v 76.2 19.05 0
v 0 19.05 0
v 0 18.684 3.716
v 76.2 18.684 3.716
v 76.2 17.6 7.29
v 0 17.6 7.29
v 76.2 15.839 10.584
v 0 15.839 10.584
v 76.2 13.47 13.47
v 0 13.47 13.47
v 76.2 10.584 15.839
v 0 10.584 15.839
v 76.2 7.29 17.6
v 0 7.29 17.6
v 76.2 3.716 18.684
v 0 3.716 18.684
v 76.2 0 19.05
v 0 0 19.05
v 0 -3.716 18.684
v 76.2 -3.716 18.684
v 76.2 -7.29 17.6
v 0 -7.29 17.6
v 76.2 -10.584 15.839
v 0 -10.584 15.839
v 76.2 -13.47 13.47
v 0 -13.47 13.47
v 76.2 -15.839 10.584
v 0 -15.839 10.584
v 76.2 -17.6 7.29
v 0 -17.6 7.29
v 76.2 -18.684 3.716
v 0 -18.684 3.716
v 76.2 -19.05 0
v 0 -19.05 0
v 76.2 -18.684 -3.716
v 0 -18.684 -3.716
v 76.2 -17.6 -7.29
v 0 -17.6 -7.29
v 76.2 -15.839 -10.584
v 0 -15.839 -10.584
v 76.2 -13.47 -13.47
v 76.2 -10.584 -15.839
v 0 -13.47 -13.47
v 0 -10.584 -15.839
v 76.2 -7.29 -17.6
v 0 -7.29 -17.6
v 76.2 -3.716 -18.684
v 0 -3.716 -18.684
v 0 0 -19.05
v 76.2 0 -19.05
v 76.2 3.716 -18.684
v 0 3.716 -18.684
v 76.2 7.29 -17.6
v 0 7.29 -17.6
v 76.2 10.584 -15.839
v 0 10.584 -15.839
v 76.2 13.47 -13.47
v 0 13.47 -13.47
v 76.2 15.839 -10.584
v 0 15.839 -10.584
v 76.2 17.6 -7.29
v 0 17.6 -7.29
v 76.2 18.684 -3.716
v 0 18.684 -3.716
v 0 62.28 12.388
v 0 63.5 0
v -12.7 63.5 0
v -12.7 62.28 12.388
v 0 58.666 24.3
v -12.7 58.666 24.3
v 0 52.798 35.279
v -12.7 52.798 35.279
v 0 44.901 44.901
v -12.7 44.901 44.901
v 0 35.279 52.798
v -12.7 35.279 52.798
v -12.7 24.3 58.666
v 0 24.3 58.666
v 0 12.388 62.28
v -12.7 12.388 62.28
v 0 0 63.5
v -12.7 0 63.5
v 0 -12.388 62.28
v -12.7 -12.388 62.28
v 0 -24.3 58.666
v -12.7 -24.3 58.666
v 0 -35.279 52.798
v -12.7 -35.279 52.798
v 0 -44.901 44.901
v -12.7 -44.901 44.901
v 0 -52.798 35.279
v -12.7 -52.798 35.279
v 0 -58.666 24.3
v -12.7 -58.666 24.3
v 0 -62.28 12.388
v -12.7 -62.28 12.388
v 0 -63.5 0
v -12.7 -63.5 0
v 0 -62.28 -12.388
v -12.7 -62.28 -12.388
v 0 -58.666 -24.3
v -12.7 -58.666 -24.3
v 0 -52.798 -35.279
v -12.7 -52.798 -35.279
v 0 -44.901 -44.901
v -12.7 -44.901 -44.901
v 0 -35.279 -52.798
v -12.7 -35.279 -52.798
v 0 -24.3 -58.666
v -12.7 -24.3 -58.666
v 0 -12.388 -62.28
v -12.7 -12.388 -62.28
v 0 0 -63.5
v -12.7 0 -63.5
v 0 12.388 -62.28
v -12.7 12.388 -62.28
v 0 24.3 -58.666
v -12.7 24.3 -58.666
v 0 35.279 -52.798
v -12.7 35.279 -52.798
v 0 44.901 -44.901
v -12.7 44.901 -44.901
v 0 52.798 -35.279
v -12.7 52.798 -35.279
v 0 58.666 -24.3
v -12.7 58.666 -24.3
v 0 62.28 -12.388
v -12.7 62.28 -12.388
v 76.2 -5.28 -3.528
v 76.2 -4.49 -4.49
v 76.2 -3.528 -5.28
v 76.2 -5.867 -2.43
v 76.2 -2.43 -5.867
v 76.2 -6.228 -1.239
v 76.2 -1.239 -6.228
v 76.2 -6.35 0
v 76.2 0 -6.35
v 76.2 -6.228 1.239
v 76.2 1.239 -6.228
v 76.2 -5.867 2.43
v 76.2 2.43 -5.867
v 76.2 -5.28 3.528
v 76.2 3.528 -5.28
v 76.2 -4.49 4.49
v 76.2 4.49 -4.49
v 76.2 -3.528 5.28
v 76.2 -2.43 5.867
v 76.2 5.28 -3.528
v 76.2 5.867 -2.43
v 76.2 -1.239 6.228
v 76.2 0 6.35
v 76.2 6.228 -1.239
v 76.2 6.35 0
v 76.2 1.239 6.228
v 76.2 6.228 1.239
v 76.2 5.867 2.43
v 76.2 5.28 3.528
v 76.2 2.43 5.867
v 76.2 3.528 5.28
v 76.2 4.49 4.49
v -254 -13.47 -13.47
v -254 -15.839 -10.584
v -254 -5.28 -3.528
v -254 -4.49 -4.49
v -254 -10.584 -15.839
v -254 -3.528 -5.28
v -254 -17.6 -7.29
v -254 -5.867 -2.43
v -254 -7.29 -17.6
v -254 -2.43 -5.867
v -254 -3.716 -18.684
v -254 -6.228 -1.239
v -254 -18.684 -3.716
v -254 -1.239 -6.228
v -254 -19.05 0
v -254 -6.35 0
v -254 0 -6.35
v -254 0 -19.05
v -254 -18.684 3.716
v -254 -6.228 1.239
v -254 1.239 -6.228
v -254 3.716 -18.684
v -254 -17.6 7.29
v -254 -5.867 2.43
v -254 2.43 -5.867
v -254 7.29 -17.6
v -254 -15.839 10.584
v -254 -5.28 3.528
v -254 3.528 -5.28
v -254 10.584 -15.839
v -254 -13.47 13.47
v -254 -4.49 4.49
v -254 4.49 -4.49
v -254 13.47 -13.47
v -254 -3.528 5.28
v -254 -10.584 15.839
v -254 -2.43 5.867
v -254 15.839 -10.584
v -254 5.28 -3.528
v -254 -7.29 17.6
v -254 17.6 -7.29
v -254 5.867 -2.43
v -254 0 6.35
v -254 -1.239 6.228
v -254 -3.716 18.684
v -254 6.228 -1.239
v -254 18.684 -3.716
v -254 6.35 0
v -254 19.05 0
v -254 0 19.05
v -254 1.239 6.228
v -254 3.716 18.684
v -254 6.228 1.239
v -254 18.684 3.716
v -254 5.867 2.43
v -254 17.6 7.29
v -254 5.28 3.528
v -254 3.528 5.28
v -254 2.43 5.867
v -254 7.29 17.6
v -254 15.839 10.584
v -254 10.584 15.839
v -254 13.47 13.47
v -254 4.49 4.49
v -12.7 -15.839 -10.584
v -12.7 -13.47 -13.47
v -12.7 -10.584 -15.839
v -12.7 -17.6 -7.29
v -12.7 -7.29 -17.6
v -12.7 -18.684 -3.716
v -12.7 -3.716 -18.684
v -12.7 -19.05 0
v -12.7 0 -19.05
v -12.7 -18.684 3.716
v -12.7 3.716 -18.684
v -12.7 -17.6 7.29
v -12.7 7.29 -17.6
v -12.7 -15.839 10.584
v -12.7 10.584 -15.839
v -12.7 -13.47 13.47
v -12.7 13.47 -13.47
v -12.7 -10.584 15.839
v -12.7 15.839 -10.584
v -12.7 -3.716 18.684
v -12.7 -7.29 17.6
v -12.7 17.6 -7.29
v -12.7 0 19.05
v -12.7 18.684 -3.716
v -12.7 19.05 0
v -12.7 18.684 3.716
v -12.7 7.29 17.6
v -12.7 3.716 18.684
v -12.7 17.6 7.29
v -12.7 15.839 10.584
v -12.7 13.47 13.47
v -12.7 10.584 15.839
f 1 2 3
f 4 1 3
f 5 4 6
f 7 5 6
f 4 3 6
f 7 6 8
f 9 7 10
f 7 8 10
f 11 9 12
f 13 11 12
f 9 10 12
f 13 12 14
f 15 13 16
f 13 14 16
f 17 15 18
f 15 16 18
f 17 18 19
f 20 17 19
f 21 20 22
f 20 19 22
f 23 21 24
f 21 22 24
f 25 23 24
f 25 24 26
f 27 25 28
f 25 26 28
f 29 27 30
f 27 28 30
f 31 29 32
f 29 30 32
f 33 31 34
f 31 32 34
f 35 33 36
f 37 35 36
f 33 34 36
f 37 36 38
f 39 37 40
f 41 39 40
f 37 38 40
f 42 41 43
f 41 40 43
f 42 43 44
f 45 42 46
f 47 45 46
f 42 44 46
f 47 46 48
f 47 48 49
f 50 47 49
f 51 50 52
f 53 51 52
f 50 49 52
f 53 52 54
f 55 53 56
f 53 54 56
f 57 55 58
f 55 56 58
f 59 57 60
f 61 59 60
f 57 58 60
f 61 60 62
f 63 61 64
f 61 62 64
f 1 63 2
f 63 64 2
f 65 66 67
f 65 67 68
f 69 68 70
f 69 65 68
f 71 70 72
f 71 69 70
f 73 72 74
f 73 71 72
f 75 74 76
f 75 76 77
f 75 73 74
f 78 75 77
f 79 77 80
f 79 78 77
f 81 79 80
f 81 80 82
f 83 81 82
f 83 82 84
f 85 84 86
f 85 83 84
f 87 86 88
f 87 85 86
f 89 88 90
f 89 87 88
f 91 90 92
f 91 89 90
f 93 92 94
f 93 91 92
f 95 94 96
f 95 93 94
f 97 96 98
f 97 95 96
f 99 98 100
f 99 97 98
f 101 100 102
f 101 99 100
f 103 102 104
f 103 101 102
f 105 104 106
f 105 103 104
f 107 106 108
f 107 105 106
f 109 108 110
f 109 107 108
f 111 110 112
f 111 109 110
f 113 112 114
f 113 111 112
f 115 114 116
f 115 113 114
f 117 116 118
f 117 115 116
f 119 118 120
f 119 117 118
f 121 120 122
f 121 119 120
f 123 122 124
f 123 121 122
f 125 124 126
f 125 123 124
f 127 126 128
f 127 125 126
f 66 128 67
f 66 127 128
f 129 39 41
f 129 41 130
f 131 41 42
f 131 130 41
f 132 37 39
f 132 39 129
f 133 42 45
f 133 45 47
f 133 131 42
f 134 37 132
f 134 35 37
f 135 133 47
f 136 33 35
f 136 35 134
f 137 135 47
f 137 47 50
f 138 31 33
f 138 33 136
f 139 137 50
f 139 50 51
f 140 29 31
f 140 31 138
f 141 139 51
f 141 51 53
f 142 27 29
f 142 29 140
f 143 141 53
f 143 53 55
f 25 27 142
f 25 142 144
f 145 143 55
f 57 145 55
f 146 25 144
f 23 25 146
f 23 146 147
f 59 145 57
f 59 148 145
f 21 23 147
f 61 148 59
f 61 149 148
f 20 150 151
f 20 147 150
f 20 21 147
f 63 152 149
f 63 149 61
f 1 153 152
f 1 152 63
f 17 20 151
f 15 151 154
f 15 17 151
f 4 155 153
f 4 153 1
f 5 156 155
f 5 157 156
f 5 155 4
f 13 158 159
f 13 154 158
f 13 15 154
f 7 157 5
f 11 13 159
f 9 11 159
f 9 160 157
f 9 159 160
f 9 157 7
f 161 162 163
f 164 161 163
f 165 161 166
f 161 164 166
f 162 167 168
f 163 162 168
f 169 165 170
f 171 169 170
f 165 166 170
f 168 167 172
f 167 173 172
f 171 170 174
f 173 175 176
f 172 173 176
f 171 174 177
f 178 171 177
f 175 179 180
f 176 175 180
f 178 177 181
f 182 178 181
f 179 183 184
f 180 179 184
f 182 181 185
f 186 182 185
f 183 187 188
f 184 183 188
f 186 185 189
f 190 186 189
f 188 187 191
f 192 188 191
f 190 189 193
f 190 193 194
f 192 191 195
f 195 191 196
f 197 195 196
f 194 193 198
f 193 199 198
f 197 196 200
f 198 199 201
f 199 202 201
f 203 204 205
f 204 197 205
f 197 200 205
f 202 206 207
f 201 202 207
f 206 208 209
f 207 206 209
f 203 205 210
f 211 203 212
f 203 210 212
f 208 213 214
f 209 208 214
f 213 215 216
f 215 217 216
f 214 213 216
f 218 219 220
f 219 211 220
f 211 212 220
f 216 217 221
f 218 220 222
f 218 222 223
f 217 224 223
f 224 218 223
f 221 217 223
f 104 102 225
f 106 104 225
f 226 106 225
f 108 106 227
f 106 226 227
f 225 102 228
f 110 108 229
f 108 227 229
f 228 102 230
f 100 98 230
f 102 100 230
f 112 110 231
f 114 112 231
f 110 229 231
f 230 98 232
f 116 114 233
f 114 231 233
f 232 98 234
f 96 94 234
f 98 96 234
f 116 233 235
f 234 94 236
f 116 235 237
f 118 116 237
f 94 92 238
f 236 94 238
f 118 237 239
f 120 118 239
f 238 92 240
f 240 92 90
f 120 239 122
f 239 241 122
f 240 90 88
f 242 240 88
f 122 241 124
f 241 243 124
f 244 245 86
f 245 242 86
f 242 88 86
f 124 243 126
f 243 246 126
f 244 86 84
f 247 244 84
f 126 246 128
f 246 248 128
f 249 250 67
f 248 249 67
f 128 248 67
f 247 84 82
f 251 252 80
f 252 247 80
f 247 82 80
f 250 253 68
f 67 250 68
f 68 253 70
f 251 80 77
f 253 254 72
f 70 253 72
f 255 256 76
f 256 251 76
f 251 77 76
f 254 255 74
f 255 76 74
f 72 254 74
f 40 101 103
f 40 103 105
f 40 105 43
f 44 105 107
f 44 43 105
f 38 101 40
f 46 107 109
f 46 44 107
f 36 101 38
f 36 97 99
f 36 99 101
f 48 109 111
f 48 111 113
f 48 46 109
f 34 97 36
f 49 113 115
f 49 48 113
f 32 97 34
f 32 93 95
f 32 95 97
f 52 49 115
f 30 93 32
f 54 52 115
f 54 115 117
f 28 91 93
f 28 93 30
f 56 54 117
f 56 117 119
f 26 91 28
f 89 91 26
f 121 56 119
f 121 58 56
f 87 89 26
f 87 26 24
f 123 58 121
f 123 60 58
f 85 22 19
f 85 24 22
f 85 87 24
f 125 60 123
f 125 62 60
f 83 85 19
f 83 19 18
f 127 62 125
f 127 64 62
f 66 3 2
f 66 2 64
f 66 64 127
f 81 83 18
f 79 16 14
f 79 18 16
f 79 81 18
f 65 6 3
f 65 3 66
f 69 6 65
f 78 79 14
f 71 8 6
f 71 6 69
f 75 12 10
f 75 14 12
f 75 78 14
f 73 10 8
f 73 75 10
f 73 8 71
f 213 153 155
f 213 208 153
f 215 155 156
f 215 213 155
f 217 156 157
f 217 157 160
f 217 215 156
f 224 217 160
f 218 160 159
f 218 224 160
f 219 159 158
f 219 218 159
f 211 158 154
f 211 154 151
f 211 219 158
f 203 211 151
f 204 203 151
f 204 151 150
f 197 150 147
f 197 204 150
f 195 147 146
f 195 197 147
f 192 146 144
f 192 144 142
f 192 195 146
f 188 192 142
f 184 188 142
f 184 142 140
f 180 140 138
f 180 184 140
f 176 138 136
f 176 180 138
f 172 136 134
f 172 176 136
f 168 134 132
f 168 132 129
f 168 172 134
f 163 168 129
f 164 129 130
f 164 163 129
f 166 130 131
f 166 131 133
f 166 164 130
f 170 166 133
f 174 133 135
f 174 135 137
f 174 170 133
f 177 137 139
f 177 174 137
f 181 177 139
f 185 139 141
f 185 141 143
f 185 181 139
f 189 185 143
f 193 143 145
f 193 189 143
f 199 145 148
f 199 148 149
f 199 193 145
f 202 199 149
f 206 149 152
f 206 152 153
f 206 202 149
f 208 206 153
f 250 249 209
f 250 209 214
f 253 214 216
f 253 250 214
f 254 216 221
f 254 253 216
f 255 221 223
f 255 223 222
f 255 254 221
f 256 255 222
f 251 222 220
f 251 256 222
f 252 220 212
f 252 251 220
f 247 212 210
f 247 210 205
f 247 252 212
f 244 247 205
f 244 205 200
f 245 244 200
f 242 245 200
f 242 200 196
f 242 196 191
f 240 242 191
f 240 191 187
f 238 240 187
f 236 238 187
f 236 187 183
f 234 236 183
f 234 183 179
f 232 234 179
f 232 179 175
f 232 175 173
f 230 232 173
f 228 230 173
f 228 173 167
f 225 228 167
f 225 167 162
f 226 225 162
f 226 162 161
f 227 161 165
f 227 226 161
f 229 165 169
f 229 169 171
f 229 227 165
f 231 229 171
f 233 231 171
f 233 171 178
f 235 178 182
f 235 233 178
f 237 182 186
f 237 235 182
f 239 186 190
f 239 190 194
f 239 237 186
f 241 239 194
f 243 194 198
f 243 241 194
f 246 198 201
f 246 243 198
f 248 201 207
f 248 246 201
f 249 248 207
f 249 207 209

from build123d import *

# Parameters (mm, degrees)
F0_R          = 19.05
F0_R_2        = 6.35
F1_DEPTH      = 254
F1_DEPTH_BACK = 76.2
F0_R_3        = 63.5
F2_DEPTH      = 12.7


with BuildPart() as f1:
    # F0 (on Right) → F1 (new body, two sides)
    with BuildSketch(Plane.YZ) as f1_sk:
        Circle(F0_R)
        Circle(F0_R_2, mode=Mode.SUBTRACT)
    extrude(amount=-F1_DEPTH)
    extrude(f1_sk.sketch, amount=F1_DEPTH_BACK)

    # F0 (on Right) → F2 (join)
    with BuildSketch(Plane.YZ):
        Circle(F0_R_3)
        Circle(F0_R, mode=Mode.SUBTRACT)
    extrude(amount=-F2_DEPTH)


solid = f1.part
